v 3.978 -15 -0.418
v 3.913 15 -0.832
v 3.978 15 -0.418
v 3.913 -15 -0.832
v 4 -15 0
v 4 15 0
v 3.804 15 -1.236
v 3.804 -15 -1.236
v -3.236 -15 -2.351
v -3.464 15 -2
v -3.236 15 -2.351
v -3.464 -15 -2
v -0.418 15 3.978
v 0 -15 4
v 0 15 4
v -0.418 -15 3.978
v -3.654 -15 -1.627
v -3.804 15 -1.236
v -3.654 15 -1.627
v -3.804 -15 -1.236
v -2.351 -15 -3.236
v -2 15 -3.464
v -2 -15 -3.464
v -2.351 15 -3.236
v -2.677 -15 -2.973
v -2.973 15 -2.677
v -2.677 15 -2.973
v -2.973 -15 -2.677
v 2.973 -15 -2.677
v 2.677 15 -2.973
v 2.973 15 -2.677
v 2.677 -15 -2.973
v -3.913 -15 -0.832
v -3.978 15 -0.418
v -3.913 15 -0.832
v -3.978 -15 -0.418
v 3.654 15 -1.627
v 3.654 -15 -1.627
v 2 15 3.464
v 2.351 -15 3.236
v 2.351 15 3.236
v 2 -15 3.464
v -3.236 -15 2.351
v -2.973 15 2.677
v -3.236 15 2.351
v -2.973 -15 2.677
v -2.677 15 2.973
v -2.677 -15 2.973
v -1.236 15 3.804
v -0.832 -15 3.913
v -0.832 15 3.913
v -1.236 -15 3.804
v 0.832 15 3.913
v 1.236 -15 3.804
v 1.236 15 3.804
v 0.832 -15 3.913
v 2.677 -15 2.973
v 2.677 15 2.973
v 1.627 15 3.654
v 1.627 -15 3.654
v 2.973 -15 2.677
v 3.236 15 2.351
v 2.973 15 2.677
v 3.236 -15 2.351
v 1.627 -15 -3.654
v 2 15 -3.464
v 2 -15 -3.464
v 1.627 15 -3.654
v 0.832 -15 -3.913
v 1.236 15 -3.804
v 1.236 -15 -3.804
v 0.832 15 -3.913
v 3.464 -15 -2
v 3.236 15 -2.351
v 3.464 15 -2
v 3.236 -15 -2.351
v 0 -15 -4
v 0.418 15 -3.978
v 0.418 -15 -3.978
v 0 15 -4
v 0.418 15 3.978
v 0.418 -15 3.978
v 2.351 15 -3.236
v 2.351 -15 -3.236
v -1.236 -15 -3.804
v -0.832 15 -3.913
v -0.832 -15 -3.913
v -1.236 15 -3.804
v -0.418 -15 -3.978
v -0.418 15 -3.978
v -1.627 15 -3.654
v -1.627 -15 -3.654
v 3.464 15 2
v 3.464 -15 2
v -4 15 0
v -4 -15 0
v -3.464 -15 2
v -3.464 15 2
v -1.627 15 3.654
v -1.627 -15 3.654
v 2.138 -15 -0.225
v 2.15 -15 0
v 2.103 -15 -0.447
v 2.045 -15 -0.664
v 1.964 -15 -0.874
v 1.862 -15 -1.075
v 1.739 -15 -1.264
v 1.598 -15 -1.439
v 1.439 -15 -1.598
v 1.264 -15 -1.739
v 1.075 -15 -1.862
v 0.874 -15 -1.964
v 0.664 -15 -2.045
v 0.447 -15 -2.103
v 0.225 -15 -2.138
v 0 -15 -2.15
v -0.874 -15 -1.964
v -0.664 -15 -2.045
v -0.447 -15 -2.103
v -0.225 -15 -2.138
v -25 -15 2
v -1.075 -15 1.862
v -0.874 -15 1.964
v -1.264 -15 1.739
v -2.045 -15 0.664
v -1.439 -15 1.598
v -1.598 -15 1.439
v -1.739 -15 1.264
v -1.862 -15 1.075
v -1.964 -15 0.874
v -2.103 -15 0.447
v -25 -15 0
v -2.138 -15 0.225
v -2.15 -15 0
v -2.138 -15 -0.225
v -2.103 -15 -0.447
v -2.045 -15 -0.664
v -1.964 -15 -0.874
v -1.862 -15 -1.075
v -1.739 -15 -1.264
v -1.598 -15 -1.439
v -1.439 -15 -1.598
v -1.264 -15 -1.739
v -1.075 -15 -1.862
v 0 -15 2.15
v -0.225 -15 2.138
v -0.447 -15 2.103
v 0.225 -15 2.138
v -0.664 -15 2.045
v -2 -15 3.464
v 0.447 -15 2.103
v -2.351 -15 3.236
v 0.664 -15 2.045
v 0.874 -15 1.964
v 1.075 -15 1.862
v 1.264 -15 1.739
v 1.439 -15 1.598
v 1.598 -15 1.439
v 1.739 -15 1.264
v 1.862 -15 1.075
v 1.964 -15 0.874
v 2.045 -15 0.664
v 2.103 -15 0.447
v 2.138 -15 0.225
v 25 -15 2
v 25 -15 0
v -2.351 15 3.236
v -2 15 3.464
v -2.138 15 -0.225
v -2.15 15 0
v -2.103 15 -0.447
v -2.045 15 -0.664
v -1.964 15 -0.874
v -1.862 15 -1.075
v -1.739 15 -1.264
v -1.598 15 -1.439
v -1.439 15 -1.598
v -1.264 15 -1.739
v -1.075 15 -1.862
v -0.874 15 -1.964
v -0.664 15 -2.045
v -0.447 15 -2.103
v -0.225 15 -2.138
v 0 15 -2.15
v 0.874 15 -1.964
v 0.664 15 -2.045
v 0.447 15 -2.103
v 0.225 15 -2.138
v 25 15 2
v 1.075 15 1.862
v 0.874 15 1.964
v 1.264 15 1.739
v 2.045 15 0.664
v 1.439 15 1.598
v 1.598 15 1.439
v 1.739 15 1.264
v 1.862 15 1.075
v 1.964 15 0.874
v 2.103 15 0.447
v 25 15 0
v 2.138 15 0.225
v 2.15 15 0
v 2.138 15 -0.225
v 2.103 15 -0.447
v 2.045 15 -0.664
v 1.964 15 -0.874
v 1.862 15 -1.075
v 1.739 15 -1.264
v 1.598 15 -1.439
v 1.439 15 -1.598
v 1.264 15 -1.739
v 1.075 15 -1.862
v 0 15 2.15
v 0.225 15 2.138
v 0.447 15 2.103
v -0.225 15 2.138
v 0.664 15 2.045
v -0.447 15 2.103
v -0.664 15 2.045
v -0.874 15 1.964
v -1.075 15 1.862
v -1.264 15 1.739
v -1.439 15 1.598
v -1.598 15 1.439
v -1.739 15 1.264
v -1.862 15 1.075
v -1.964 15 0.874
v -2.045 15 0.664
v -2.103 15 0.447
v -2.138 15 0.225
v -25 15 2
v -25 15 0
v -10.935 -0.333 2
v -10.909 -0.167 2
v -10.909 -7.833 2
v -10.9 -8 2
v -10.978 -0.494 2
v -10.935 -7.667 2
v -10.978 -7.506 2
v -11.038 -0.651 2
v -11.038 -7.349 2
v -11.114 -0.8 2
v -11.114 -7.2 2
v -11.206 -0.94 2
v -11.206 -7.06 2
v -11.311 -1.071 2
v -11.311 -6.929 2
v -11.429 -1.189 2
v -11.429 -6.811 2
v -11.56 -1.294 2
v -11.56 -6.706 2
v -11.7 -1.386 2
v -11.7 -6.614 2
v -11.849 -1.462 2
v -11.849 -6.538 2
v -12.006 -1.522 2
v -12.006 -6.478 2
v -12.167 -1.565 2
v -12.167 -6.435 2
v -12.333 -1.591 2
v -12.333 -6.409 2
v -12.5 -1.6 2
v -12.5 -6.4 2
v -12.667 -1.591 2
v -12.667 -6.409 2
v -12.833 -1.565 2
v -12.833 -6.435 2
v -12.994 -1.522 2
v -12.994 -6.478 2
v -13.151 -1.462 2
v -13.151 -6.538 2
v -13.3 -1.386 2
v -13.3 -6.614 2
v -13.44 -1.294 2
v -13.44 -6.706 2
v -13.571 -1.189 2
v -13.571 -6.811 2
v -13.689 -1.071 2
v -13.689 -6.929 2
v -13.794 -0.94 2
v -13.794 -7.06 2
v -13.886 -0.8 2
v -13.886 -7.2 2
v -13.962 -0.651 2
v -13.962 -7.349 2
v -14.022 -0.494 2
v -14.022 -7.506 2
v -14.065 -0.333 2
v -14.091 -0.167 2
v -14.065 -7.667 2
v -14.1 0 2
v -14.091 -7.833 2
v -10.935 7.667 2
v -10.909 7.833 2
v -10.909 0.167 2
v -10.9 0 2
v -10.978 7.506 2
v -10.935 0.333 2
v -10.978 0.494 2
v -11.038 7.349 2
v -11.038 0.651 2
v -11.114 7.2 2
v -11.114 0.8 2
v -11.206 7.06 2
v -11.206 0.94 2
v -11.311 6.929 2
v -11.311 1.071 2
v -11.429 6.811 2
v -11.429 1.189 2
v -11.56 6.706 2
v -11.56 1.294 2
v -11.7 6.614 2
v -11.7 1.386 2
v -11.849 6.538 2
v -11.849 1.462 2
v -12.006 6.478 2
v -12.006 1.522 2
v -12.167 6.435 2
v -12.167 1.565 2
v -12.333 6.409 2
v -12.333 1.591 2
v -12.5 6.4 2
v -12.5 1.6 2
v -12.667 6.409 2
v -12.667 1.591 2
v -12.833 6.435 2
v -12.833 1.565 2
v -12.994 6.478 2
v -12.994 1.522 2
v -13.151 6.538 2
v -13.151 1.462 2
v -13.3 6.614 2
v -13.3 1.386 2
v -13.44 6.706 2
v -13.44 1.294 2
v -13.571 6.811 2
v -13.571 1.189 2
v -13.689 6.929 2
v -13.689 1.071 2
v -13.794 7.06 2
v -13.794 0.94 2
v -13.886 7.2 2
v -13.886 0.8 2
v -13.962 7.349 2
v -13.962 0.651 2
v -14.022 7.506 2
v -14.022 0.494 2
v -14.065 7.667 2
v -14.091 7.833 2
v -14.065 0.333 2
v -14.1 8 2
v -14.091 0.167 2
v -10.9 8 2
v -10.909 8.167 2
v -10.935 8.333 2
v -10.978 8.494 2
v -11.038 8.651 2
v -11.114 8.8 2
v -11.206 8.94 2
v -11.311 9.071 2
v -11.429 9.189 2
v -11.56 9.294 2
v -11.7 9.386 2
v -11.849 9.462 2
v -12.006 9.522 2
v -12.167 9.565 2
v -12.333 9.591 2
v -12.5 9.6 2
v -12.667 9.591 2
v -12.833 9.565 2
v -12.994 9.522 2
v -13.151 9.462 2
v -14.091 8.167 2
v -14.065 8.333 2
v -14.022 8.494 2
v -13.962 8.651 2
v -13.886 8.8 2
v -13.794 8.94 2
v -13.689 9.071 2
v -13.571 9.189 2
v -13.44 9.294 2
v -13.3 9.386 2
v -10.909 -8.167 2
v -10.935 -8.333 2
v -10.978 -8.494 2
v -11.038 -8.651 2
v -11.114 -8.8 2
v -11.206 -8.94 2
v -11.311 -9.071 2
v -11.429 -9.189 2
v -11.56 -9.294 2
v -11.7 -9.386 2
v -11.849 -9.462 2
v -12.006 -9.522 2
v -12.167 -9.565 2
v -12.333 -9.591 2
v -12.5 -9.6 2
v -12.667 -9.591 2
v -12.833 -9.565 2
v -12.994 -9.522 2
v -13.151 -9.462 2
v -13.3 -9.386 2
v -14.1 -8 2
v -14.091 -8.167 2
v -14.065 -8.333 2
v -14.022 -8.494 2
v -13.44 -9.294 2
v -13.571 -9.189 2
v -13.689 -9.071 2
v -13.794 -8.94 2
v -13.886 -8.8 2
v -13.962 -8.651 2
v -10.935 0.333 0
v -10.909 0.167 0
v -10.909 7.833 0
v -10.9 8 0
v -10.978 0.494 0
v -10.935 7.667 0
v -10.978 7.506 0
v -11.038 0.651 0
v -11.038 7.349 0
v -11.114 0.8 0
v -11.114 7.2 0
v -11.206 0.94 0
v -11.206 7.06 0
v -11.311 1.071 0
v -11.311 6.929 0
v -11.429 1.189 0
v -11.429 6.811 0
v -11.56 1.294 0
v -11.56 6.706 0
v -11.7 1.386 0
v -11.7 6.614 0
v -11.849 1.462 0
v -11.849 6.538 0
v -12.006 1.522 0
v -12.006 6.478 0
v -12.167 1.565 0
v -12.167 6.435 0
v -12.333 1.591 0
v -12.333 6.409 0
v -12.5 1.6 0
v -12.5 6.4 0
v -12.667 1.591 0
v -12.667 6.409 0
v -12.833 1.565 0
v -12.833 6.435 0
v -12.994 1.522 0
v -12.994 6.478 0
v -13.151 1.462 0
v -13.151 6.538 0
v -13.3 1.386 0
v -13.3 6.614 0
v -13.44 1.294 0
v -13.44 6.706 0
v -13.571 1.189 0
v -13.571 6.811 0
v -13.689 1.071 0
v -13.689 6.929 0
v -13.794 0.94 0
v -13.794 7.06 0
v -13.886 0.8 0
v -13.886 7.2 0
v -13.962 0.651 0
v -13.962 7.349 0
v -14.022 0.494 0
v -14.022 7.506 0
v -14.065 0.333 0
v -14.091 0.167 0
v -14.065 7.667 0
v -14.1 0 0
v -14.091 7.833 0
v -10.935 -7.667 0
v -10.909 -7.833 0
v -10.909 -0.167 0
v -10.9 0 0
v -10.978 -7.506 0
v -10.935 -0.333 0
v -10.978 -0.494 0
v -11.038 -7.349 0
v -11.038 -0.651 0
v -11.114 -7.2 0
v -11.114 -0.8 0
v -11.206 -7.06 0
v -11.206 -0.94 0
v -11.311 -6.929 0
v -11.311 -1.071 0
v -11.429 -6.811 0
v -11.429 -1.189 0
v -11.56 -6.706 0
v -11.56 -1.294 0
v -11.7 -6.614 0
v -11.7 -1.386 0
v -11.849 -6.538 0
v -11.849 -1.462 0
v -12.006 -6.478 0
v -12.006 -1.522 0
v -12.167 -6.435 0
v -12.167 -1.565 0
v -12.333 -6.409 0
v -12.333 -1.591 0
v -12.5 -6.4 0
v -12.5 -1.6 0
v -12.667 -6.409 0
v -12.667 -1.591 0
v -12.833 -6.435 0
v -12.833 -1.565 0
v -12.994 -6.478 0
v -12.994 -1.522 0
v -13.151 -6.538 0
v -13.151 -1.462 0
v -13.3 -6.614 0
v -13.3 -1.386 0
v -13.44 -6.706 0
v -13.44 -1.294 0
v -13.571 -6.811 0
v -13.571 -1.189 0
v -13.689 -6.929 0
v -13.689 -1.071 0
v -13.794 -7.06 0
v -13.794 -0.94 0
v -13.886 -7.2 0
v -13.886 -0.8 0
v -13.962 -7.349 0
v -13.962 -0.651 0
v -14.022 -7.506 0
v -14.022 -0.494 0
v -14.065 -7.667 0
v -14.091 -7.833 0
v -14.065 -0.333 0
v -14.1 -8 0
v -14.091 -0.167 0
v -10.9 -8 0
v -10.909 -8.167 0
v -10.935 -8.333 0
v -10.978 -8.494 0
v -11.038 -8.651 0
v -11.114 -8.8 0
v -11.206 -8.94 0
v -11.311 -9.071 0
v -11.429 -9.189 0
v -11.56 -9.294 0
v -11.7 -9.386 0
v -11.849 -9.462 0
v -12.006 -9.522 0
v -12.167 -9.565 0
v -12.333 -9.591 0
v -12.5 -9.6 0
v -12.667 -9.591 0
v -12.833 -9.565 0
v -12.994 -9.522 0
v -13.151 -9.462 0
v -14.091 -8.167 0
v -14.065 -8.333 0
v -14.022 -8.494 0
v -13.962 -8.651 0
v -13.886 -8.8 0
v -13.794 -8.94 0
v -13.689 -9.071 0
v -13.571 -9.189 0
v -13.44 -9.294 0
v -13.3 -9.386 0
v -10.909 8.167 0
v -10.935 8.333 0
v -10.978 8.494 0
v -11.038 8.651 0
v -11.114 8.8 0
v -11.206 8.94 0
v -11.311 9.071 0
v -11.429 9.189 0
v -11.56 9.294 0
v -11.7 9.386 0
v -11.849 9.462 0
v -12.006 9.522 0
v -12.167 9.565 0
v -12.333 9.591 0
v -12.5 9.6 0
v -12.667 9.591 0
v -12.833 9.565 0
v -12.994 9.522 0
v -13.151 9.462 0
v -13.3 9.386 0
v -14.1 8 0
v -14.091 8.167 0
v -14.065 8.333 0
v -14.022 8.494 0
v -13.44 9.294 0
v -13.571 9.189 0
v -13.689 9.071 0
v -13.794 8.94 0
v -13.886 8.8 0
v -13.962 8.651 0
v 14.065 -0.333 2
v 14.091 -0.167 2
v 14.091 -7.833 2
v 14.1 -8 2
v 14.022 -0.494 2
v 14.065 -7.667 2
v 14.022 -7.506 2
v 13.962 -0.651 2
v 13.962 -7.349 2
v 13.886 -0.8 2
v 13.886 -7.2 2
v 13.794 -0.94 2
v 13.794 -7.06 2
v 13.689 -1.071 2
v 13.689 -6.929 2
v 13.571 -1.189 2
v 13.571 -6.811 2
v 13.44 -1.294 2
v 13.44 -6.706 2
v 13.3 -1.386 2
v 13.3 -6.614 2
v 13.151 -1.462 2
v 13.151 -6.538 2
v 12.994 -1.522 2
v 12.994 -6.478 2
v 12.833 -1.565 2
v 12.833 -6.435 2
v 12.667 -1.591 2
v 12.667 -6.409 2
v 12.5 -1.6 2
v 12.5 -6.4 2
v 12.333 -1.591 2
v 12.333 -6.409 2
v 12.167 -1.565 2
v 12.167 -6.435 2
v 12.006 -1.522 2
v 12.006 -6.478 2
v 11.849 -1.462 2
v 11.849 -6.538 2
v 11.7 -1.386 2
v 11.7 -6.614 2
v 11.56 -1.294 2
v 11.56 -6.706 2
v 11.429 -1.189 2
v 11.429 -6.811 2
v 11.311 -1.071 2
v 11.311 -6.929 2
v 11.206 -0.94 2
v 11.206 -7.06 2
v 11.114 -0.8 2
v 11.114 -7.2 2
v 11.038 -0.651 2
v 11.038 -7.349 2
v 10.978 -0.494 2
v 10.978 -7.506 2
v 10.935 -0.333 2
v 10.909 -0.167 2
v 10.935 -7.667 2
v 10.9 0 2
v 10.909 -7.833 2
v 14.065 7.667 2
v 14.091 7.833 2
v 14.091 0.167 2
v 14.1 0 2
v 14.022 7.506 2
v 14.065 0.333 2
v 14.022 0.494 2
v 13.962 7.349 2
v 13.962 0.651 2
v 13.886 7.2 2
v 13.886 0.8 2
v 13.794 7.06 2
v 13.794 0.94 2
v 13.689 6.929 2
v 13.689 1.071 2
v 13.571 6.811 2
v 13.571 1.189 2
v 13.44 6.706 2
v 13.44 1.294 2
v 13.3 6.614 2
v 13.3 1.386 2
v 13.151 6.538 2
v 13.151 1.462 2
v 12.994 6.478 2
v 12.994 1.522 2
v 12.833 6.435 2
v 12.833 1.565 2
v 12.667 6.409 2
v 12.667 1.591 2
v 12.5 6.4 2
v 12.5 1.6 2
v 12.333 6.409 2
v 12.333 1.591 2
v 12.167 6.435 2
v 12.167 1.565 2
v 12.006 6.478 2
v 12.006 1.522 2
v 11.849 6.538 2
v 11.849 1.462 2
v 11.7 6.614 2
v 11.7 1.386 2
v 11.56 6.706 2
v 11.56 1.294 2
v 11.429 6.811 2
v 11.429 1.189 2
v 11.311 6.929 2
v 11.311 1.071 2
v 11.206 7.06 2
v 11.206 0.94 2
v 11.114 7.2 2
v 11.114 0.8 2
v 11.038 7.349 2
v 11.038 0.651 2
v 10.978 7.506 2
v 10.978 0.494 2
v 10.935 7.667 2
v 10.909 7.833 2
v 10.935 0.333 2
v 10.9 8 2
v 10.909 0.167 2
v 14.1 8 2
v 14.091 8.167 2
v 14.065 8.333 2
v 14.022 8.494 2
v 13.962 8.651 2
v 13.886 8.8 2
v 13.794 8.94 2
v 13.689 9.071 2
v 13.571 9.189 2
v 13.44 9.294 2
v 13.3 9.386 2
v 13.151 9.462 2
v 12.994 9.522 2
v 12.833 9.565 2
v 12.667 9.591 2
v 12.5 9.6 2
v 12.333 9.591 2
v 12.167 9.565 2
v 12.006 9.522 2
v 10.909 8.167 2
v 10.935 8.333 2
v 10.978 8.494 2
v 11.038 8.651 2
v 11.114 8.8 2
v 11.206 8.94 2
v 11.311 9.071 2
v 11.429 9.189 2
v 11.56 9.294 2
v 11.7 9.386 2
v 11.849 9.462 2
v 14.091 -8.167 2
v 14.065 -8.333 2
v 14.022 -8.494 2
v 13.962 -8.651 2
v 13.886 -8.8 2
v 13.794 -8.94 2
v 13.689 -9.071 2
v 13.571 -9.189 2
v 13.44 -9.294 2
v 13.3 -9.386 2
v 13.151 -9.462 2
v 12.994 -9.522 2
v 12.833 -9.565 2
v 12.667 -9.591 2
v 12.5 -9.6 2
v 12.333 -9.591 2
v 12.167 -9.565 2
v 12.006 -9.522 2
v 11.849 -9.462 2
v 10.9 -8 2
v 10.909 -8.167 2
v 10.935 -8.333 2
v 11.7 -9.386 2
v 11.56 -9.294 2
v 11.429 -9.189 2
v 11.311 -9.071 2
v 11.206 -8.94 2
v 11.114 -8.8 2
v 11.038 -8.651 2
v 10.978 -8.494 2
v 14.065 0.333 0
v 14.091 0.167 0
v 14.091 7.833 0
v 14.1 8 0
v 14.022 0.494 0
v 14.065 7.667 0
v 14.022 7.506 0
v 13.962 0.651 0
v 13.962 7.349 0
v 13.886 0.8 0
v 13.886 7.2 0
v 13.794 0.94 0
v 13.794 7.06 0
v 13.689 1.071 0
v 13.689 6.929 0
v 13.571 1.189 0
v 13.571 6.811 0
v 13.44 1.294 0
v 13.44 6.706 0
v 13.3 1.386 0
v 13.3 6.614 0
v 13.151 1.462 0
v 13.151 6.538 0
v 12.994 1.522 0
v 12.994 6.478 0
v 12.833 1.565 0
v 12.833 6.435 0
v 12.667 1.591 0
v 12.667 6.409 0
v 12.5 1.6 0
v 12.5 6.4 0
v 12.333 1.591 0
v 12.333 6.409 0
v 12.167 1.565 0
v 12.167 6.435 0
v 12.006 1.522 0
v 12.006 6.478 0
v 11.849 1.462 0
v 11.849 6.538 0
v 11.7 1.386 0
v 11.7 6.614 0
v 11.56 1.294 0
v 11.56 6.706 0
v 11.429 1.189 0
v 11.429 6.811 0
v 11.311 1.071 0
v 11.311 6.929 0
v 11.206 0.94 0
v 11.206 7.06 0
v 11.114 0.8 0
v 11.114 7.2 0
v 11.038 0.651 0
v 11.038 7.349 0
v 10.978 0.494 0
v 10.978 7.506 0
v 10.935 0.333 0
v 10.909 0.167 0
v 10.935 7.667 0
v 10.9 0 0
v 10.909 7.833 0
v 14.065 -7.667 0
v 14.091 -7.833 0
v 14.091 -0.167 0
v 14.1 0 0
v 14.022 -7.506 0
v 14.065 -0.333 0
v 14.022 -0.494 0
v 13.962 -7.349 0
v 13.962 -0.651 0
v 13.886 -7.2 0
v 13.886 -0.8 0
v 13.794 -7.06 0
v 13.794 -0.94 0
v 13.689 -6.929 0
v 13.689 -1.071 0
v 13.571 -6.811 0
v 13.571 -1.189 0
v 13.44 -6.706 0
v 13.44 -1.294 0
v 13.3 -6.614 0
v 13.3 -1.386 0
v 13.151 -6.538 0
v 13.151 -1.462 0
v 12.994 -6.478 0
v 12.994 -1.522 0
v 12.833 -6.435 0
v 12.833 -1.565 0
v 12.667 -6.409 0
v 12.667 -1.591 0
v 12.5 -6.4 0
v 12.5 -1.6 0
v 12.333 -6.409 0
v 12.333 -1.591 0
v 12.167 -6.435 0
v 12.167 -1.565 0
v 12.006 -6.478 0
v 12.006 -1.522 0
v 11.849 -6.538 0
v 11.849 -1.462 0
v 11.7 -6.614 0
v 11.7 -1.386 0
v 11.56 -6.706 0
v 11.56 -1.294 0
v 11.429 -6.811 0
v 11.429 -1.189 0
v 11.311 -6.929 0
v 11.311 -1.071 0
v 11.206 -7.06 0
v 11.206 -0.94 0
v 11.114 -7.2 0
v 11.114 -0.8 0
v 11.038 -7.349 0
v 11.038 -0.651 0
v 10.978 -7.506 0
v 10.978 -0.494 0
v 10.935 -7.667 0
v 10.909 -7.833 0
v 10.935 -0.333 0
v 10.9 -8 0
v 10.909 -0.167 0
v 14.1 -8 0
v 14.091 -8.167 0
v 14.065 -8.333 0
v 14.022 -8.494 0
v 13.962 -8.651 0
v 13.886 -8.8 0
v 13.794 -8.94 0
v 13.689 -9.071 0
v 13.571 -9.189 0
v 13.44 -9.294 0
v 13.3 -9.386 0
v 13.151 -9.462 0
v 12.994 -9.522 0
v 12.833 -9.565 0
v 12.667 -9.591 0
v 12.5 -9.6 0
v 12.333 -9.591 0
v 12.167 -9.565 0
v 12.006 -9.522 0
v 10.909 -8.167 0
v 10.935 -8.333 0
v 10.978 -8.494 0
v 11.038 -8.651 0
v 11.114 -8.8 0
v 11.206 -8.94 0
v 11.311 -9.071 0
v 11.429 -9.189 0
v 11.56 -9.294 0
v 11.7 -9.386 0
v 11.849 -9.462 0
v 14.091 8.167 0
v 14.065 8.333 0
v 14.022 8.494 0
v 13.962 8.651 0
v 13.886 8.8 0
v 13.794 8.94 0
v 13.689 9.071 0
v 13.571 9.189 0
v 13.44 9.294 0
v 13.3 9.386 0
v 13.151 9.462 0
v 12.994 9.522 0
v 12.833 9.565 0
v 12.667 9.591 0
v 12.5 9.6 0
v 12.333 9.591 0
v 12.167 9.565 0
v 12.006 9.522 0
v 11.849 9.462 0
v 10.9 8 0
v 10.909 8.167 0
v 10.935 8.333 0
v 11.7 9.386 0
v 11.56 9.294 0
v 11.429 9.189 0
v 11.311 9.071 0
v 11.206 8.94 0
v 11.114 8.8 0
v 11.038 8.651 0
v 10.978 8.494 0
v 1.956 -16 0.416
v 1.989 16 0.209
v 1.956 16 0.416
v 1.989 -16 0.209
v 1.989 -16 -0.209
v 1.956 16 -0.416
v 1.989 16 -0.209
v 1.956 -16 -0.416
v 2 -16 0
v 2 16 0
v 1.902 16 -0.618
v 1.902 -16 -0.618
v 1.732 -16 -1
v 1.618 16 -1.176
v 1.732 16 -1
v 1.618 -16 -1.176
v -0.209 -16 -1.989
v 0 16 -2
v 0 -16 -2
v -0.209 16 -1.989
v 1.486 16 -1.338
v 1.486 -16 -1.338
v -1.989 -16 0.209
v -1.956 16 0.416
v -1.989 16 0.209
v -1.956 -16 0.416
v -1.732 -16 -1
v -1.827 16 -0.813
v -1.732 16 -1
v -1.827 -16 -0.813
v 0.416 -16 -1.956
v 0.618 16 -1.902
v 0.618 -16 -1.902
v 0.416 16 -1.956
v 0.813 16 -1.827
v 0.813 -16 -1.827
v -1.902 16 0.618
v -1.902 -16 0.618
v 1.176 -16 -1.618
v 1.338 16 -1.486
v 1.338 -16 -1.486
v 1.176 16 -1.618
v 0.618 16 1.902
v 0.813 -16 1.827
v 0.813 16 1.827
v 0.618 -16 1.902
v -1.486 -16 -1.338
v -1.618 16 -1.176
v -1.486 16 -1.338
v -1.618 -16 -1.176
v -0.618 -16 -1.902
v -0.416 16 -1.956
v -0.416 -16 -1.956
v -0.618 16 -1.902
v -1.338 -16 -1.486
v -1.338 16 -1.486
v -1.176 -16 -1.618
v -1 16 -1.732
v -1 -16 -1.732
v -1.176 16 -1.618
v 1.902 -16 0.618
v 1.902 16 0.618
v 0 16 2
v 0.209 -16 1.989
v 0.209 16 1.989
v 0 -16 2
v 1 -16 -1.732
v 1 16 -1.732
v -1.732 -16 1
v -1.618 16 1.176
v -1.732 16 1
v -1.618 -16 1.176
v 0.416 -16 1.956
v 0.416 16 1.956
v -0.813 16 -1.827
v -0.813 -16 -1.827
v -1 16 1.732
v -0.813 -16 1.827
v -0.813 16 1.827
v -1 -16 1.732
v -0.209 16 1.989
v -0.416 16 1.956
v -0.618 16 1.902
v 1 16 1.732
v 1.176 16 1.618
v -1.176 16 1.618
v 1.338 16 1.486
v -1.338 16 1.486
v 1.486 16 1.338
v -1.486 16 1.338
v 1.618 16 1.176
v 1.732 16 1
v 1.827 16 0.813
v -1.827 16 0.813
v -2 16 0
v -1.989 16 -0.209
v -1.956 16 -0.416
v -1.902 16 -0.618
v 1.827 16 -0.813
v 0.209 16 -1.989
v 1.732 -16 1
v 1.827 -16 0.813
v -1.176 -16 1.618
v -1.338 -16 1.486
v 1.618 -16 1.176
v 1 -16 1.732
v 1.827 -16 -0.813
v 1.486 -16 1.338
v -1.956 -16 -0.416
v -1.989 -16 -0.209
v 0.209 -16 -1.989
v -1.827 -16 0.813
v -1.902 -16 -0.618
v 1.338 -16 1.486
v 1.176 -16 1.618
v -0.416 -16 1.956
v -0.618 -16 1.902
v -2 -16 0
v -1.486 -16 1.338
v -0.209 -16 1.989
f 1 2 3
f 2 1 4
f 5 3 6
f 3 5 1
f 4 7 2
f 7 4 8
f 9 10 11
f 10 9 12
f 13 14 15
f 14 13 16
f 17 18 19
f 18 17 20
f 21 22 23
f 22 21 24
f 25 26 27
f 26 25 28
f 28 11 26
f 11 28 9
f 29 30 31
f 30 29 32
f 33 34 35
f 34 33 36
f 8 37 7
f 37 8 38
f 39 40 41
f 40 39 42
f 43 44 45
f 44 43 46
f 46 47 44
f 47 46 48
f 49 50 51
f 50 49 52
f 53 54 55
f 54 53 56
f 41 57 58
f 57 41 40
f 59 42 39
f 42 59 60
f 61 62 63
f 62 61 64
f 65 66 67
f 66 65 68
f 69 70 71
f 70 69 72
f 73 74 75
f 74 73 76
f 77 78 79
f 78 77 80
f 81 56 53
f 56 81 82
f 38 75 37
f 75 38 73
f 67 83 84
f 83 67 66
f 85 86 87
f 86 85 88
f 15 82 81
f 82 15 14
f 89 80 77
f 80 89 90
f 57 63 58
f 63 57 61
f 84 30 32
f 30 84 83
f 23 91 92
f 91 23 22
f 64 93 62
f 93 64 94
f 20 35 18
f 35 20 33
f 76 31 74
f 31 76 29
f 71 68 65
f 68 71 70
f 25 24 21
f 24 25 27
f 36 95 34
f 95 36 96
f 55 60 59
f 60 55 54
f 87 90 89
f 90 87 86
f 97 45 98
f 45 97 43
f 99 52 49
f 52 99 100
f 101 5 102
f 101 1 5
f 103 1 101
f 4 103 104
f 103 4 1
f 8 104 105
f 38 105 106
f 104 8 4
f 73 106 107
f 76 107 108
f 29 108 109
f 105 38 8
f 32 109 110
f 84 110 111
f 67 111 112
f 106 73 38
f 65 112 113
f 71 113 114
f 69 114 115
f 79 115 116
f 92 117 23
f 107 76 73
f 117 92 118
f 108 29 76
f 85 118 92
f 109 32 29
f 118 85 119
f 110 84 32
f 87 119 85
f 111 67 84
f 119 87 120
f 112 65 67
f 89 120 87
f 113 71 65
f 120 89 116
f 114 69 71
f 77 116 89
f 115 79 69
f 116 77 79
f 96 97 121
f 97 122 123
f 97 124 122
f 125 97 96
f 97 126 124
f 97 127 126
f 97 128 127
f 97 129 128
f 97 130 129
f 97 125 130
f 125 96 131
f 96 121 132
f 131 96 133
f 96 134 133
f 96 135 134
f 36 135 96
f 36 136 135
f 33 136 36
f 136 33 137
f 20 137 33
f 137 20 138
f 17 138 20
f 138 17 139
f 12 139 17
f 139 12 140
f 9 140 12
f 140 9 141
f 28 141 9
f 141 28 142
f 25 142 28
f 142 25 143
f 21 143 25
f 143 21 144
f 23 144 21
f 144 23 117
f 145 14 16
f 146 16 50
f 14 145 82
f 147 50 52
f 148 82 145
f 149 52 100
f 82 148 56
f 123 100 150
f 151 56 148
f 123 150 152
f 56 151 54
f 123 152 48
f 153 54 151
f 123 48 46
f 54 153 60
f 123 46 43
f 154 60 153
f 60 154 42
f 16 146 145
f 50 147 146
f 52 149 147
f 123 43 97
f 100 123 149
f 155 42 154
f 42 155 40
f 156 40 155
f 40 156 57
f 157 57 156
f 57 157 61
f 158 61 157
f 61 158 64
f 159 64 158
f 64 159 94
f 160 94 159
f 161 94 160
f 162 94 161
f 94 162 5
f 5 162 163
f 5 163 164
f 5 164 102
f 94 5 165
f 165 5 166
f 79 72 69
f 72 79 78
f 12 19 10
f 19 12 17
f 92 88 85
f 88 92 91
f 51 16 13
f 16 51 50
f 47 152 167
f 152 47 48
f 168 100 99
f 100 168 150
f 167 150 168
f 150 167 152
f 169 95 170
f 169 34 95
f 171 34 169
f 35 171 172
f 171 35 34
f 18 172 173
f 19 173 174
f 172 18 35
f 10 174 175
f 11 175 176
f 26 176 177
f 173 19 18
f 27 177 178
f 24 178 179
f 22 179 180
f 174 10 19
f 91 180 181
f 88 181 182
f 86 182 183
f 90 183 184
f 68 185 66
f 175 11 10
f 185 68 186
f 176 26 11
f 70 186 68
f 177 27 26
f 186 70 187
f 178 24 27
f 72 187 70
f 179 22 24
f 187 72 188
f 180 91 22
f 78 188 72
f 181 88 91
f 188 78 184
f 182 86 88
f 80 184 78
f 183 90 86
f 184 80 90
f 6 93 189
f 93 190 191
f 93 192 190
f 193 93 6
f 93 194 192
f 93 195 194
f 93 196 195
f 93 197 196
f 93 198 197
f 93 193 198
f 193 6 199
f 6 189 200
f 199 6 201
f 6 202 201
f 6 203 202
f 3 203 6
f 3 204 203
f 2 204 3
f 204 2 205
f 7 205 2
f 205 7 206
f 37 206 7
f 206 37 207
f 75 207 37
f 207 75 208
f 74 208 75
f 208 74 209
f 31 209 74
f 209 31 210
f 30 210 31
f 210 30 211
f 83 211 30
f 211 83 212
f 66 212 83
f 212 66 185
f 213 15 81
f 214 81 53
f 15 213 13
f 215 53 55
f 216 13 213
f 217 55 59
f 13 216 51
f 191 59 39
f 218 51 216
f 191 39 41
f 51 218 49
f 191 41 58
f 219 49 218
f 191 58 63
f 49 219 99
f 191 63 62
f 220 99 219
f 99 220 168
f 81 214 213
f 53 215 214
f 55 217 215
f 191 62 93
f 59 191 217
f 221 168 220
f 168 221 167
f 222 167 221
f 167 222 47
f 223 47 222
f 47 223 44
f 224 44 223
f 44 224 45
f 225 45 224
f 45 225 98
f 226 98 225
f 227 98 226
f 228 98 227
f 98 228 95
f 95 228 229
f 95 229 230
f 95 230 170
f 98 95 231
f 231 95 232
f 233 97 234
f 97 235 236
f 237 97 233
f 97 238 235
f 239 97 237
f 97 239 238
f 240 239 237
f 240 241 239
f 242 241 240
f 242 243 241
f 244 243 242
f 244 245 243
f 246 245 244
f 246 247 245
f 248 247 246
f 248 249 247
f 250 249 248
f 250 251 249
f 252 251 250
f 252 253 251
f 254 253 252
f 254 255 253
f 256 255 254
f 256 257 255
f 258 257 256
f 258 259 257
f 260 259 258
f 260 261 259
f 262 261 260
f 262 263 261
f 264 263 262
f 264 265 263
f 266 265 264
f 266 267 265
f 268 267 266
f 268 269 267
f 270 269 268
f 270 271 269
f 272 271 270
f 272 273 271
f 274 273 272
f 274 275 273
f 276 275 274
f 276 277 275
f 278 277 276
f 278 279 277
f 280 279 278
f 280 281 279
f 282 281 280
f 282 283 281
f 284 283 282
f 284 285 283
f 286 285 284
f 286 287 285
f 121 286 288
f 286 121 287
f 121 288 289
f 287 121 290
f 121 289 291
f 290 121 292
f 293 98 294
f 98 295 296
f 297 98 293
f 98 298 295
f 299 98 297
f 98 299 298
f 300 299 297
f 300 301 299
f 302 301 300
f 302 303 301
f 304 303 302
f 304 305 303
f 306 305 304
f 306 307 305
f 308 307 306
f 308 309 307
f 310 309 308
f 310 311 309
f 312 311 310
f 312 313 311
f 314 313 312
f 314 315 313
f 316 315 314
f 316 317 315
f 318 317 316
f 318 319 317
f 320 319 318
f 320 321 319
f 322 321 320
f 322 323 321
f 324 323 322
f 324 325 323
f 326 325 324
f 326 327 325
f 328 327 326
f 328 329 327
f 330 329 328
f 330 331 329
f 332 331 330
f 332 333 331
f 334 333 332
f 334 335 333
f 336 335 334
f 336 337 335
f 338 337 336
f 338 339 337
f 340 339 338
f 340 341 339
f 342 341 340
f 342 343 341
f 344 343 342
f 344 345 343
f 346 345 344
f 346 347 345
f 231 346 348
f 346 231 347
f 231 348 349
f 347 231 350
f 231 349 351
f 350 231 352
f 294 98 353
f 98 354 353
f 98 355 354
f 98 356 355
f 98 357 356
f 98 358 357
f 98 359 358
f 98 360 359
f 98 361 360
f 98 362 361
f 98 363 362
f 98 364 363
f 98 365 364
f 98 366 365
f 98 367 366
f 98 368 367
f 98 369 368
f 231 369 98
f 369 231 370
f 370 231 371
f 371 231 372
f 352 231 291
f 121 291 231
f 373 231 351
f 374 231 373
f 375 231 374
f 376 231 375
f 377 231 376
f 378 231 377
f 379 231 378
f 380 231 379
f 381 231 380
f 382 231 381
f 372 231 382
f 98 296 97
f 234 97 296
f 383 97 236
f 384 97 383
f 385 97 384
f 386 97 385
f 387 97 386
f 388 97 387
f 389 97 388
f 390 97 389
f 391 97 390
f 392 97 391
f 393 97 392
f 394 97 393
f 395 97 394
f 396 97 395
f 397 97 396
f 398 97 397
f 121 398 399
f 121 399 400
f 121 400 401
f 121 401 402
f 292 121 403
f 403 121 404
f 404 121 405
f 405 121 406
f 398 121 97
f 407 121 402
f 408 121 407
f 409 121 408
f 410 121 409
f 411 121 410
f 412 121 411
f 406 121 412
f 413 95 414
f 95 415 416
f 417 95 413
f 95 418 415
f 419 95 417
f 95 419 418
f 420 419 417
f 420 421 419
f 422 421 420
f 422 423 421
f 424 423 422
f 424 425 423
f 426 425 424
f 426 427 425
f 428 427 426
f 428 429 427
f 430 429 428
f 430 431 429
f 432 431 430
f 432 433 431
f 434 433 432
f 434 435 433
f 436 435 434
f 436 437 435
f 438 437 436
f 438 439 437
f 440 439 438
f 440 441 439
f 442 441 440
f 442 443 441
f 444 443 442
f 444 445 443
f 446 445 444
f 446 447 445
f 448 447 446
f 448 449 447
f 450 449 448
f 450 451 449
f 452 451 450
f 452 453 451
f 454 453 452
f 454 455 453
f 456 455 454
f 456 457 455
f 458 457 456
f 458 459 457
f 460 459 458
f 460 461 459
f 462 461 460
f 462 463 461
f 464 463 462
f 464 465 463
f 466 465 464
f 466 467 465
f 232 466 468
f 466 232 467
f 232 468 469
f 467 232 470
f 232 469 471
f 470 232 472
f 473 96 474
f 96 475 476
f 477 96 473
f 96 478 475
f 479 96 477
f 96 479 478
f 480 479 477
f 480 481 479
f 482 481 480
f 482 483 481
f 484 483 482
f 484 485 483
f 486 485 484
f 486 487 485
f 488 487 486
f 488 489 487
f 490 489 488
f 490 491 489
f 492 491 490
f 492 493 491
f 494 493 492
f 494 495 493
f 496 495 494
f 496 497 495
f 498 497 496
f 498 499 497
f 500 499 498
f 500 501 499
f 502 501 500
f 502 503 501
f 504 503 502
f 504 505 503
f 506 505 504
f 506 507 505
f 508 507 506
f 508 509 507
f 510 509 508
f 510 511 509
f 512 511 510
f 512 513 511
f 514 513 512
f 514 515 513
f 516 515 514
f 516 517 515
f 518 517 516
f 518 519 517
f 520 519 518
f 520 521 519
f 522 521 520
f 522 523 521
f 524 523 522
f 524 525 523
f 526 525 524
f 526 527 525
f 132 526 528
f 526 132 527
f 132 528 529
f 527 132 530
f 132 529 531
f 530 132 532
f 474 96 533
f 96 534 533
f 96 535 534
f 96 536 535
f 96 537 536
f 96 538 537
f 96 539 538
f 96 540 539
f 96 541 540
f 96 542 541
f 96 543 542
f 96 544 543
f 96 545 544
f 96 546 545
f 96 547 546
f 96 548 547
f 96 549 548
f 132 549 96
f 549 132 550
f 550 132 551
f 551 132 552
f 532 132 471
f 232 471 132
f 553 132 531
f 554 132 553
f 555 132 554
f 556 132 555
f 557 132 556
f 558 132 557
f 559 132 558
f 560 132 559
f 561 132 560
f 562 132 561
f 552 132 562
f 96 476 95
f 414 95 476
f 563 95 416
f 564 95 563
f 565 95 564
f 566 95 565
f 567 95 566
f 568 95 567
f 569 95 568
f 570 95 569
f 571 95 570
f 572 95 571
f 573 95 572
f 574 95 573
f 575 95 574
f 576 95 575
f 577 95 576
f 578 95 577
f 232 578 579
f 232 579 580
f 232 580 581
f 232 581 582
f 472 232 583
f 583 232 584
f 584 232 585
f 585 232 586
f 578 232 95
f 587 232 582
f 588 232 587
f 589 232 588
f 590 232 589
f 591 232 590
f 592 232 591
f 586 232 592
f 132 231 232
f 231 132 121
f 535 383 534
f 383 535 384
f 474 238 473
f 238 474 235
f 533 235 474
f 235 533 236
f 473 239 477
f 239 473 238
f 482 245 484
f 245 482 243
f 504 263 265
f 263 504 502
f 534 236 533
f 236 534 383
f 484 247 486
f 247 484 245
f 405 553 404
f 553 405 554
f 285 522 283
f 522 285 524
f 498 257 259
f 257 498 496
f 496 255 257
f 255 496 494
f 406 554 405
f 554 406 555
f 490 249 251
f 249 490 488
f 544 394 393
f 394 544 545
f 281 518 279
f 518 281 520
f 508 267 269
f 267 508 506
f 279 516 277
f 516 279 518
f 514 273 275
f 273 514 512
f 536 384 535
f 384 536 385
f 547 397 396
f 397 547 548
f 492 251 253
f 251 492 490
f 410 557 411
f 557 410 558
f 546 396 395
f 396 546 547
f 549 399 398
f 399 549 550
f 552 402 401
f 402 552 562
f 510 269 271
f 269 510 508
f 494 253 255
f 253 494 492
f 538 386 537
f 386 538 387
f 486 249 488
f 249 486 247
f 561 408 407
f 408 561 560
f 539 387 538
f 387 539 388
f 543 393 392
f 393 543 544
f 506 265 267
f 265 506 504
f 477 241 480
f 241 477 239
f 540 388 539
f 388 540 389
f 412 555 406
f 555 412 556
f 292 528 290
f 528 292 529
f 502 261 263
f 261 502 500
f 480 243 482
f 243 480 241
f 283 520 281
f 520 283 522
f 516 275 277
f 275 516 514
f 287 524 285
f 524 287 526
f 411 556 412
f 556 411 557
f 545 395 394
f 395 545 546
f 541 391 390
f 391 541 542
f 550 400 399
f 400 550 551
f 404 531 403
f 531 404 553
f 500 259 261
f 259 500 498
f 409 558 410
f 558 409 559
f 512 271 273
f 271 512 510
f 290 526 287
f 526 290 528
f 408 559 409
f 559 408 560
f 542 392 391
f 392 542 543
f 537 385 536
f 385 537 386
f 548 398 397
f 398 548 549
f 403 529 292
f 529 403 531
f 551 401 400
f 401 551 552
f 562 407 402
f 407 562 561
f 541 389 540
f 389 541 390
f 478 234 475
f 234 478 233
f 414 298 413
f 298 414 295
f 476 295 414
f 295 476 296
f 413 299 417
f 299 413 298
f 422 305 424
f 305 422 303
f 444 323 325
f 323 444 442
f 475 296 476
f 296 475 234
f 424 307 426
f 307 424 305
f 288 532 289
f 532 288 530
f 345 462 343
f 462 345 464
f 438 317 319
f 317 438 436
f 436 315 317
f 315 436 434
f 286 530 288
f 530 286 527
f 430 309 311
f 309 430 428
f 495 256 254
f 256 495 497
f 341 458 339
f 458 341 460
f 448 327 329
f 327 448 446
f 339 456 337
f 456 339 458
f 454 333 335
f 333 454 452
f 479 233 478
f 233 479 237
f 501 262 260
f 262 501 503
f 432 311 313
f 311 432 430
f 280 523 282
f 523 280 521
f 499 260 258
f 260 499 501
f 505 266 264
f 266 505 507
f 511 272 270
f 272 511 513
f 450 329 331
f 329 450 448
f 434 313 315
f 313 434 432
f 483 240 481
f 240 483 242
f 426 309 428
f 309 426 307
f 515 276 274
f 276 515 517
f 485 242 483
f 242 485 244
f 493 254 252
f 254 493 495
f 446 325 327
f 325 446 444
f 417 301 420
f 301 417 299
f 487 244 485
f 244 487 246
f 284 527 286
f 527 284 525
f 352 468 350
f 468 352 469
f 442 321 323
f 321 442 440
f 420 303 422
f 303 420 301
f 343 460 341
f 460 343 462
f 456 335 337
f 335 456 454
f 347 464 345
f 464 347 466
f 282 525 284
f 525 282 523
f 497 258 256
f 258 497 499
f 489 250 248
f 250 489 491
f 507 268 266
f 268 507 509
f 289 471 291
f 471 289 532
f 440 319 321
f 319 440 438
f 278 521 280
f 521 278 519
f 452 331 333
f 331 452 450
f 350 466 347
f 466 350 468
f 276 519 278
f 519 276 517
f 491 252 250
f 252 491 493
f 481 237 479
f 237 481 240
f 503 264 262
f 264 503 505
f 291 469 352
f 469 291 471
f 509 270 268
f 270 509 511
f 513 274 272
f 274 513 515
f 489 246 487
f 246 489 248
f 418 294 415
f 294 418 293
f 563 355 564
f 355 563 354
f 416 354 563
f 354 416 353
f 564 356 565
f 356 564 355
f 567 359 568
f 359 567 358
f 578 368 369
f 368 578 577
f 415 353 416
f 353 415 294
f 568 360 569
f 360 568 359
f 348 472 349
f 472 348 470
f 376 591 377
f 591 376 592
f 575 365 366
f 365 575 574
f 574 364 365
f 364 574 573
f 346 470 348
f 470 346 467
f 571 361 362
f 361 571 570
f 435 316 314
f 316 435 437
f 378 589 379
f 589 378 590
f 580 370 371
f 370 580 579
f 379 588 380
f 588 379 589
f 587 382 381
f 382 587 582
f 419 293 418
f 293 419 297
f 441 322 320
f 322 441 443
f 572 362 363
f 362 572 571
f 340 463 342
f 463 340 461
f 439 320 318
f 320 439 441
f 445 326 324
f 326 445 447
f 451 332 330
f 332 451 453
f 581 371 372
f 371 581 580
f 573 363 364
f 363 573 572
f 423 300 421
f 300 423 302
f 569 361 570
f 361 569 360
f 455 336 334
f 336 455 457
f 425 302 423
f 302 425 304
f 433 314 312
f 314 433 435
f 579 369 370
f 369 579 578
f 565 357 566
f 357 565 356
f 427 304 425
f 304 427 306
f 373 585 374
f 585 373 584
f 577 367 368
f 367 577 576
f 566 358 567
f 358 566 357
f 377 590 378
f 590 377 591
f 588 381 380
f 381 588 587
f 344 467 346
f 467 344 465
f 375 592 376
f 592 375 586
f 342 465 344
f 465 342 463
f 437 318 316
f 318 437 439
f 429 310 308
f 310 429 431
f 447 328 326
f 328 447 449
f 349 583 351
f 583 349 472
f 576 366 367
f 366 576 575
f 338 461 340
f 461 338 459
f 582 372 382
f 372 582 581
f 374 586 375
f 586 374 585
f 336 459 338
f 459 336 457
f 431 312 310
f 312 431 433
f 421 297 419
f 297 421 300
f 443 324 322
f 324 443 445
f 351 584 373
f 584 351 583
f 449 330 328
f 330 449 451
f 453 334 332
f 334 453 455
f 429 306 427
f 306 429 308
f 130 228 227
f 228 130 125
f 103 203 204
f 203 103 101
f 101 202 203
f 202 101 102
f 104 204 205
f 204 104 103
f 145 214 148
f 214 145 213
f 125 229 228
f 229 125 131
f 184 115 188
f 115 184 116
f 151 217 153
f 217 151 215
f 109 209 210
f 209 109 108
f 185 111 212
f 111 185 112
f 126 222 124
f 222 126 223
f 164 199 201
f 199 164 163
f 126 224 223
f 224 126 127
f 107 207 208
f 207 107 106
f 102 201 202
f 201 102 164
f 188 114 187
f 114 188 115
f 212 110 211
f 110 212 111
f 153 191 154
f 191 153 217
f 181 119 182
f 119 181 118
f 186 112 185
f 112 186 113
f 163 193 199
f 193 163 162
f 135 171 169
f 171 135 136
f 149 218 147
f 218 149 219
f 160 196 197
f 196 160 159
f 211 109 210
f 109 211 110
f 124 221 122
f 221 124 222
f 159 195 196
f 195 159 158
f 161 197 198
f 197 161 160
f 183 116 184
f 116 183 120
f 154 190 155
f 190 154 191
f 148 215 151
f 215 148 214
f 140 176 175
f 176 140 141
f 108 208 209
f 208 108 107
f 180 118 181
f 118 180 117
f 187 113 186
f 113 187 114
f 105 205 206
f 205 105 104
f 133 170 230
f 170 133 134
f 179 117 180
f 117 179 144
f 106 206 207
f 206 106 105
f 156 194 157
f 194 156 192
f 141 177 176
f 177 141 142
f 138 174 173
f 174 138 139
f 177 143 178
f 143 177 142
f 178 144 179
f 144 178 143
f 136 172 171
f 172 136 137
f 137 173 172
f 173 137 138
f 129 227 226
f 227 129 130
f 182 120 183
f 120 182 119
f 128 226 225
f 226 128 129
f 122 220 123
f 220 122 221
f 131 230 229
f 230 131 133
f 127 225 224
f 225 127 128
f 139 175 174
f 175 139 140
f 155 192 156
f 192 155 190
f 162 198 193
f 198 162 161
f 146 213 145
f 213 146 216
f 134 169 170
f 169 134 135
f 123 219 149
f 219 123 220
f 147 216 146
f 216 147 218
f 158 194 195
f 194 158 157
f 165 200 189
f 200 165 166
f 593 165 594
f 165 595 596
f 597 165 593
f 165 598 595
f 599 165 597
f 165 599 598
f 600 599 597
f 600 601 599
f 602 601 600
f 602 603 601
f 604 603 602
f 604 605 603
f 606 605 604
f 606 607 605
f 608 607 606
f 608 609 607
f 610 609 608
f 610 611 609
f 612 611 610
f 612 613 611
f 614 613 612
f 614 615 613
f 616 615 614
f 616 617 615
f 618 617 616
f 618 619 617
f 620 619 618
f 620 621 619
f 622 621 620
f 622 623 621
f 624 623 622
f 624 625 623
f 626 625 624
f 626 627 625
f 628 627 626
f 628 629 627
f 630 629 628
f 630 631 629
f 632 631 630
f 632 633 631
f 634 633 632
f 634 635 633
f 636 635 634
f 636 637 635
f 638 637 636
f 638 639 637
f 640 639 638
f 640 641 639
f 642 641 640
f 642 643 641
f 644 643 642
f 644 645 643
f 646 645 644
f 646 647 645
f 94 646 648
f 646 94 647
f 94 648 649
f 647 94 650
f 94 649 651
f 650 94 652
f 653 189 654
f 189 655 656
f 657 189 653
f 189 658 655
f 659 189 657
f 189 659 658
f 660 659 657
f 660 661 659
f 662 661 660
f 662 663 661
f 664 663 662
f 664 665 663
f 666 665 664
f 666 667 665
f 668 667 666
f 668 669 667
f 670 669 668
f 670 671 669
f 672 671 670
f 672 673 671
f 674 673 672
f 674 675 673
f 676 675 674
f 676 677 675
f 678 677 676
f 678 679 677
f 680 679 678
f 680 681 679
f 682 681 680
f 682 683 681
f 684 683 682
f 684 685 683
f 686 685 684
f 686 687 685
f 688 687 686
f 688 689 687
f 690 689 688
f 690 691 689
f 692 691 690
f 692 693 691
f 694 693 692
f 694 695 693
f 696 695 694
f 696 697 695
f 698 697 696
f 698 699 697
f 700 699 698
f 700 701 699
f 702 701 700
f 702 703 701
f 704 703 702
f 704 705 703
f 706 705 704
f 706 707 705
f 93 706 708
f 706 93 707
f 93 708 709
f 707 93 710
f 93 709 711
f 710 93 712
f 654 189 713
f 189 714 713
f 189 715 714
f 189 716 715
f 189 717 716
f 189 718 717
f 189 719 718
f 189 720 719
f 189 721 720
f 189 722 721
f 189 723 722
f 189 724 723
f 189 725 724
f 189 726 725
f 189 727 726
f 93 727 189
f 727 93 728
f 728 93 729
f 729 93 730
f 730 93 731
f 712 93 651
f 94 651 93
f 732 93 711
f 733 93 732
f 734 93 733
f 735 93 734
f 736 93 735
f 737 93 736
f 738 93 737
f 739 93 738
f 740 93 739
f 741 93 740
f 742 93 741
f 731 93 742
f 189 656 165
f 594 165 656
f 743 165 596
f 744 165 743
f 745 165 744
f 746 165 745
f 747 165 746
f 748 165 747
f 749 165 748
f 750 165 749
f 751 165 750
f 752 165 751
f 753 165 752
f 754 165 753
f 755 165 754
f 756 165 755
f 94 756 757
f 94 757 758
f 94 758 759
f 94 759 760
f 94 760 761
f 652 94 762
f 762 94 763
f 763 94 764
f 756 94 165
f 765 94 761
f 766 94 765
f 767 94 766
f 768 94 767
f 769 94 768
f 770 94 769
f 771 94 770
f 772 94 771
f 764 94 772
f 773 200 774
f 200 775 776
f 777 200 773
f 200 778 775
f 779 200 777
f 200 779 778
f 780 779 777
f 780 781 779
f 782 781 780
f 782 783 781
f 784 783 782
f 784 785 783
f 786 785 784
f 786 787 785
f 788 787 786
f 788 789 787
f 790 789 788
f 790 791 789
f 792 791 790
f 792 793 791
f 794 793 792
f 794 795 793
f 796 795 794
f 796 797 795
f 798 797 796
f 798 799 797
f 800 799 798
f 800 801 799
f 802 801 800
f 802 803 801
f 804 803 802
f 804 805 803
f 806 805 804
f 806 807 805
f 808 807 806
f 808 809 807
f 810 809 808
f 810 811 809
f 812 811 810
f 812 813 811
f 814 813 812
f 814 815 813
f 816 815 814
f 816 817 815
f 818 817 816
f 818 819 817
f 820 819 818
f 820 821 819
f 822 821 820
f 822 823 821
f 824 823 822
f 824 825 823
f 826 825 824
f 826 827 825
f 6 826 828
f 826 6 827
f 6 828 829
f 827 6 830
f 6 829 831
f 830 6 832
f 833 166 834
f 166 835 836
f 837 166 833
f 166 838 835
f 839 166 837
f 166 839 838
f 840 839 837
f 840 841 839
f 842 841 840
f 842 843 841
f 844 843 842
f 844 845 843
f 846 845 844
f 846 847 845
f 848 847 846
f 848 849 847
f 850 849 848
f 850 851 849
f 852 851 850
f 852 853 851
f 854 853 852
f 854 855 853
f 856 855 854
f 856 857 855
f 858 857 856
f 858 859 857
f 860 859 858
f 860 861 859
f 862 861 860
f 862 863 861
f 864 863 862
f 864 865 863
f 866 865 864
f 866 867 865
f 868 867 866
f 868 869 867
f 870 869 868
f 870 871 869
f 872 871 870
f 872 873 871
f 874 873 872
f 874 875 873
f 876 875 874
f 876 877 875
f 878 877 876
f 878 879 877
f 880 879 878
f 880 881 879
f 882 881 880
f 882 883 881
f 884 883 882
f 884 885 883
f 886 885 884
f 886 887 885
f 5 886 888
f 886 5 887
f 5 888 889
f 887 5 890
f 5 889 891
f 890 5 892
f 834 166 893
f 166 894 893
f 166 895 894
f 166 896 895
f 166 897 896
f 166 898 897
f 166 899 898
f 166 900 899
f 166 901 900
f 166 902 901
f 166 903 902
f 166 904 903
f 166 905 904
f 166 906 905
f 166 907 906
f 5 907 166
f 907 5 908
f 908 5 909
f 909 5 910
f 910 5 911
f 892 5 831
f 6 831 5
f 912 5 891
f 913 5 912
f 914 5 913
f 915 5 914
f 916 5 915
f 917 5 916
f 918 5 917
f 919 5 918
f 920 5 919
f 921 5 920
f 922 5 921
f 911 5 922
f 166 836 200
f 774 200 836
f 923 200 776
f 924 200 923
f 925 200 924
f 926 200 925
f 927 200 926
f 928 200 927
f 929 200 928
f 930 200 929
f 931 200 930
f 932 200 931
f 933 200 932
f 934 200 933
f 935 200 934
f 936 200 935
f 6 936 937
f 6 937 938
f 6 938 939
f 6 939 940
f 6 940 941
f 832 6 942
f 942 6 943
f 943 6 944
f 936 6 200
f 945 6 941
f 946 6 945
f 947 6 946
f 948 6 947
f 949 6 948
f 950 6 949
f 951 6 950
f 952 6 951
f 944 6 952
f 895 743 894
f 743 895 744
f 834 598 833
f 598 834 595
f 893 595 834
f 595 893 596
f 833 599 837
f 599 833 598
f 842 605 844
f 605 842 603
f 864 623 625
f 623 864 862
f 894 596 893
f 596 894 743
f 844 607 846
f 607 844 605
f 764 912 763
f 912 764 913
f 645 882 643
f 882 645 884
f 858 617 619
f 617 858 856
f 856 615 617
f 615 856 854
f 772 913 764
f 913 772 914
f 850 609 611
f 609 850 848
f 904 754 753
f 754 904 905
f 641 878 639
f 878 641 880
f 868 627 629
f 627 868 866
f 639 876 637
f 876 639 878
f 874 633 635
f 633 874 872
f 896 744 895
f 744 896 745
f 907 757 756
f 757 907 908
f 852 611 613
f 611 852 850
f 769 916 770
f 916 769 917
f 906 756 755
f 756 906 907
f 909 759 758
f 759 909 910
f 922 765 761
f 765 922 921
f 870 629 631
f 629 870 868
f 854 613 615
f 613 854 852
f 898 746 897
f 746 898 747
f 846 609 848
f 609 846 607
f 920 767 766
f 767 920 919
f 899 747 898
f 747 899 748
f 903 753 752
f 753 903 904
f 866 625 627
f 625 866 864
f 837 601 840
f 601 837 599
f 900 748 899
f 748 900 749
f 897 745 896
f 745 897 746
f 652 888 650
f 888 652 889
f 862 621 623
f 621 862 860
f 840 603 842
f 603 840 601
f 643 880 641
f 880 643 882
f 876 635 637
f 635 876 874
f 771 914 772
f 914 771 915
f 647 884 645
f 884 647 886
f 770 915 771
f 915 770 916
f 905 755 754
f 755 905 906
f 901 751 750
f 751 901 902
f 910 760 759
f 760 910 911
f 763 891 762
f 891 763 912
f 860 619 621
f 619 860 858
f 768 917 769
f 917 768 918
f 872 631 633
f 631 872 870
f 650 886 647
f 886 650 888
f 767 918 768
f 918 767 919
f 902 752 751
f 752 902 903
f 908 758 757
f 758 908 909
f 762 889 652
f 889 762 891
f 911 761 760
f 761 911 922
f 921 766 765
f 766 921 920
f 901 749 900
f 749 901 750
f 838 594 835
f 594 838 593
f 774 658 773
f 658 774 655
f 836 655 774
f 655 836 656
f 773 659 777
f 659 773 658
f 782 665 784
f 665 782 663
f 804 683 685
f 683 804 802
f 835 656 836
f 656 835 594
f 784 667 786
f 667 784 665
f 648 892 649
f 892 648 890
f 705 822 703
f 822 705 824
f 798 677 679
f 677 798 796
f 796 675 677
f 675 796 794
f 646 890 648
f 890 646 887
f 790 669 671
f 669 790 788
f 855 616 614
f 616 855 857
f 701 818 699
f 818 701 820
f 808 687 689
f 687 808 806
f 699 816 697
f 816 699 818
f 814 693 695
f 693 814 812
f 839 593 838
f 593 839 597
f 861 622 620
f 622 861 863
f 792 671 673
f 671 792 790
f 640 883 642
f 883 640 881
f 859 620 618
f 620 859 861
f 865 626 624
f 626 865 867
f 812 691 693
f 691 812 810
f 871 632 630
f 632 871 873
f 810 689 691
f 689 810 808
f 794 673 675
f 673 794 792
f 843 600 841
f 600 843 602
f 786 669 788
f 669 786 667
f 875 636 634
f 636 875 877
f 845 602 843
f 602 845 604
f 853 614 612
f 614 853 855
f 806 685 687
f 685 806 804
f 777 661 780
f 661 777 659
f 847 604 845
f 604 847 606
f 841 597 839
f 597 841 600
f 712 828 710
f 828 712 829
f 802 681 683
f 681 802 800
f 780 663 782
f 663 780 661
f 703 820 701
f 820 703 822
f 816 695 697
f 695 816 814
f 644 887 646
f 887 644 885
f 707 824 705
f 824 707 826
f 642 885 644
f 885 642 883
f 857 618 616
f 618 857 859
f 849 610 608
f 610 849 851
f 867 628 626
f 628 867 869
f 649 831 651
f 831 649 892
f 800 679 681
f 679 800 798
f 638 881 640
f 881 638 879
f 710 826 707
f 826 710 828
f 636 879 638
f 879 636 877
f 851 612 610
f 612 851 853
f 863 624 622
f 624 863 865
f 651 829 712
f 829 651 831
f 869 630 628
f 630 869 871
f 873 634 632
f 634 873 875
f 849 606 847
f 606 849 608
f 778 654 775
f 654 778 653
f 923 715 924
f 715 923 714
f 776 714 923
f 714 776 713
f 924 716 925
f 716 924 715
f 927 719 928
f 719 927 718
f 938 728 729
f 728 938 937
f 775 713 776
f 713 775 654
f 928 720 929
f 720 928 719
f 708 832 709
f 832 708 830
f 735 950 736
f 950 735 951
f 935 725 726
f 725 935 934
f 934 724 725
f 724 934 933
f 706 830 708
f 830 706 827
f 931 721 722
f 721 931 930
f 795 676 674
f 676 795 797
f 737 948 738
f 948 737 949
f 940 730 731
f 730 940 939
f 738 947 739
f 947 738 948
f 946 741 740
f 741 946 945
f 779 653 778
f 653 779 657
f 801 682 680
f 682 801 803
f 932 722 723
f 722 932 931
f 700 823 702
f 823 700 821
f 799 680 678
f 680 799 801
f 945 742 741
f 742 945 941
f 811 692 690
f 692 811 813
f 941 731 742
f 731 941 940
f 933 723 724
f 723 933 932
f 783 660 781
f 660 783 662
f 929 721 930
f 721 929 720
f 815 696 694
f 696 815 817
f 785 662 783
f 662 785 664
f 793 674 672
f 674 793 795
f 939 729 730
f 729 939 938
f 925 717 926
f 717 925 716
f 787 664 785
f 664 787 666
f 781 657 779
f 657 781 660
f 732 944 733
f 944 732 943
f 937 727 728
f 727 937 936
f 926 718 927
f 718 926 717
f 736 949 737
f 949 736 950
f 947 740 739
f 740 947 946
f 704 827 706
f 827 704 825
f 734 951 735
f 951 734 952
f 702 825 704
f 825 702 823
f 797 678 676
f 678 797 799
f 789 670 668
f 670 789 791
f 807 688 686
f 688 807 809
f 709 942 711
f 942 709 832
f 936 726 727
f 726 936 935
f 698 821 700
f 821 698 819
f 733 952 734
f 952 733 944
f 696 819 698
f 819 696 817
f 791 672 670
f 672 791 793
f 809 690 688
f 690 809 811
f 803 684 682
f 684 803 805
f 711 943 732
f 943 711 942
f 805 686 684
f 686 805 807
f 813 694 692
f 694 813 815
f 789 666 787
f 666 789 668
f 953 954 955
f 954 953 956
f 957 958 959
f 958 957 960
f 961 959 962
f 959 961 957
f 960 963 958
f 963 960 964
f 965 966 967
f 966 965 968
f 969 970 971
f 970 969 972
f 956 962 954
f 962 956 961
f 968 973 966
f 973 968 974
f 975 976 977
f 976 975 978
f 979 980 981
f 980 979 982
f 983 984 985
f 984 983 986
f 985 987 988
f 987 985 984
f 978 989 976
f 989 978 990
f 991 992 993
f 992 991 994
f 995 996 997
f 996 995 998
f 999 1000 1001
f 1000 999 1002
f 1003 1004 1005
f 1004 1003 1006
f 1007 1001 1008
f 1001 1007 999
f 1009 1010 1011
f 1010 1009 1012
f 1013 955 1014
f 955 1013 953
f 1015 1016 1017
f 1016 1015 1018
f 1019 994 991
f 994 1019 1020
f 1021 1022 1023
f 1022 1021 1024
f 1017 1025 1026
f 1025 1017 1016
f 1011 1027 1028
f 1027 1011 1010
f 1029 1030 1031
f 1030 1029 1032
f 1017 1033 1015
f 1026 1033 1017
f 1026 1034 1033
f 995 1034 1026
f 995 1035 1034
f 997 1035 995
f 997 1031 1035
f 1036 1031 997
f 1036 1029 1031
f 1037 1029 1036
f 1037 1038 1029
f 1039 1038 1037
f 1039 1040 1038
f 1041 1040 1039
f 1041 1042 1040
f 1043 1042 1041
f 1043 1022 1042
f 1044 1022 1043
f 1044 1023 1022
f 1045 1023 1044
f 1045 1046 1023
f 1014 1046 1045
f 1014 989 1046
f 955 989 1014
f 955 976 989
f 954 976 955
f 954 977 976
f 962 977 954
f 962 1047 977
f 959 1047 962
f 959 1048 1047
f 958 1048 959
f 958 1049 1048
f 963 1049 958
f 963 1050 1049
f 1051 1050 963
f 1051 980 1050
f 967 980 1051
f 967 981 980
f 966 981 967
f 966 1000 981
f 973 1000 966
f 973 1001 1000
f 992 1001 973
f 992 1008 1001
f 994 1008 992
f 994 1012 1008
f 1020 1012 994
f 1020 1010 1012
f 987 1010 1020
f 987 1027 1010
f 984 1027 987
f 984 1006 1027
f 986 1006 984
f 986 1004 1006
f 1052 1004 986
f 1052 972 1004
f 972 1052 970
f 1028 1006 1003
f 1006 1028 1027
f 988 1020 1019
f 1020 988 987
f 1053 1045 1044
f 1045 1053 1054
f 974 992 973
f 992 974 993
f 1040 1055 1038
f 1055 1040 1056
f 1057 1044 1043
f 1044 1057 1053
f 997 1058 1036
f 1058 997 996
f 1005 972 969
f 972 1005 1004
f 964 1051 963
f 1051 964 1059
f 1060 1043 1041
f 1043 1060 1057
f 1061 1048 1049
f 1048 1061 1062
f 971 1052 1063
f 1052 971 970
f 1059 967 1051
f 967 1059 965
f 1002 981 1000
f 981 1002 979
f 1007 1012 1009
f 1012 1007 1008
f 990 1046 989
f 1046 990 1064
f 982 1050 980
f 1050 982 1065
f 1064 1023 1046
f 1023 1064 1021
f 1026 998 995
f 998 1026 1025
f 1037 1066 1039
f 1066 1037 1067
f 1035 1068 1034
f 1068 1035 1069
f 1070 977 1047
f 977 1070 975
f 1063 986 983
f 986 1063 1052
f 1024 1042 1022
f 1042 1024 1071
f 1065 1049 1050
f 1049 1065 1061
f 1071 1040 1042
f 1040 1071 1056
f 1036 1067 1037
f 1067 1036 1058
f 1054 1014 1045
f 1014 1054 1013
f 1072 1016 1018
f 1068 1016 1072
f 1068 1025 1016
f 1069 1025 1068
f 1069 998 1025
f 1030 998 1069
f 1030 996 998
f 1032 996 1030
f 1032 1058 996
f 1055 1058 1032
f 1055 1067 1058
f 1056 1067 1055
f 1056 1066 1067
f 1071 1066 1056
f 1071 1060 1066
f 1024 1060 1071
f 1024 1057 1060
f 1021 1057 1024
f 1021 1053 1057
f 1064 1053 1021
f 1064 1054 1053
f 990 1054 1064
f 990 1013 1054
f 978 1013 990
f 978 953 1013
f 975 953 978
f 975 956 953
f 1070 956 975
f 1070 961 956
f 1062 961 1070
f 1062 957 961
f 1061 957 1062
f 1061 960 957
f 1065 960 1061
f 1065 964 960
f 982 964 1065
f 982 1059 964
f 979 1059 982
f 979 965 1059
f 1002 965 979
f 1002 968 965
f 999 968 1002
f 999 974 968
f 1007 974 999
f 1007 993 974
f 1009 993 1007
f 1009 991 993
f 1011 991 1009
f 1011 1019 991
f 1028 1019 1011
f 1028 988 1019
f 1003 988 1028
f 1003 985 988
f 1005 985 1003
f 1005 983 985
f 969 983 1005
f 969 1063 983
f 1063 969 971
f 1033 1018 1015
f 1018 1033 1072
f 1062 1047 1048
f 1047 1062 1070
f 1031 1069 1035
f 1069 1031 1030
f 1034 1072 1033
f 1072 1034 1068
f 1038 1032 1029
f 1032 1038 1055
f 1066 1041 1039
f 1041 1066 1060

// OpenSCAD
// Parameters
leaf_w = 25;
leaf_h = 30;
leaf_t = 2;
knuckle_od = 8;
knuckle_id = 4.3;
pin_d = 4;
pin_l = 32;
knuckle_segment = 6; // 30mm / 5 = 6mm
hole_pitch = 8;

$fn = 60;

module hinge() {
    // Left Leaf
    difference() {
        union() {
            translate([-leaf_w, -leaf_h / 2, 0]) cube([leaf_w, leaf_h, leaf_t]);
            for (i = [0, 2, 4]) {
                translate([0, -leaf_h / 2 + i * knuckle_segment, 0])
                rotate([-90, 0, 0])
                cylinder(d = knuckle_od, h = knuckle_segment);
            }
        }
        // Pin hole
        translate([0, -leaf_h / 2, 0]) rotate([-90, 0, 0]) cylinder(d = knuckle_id, h = leaf_h);
        // Screw holes
        for (i = [-1, 0, 1]) {
            translate([-12.5, i * hole_pitch, -1]) {
                cylinder(d = 3.2, h = 4);
                cylinder(d1 = 6, d2 = 3.2, h = 1);
            }
        }
    }

    // Right Leaf
    difference() {
        union() {
            translate([0, -leaf_h / 2, 0]) cube([leaf_w, leaf_h, leaf_t]);
            for (i = [1, 3]) {
                translate([0, -leaf_h / 2 + i * knuckle_segment, 0])
                rotate([-90, 0, 0])
                cylinder(d = knuckle_od, h = knuckle_segment);
            }
        }
        // Pin hole
        translate([0, -leaf_h / 2, 0]) rotate([-90, 0, 0]) cylinder(d = knuckle_id, h = leaf_h);
        // Screw holes
        for (i = [-1, 0, 1]) {
            translate([12.5, i * hole_pitch, -1]) {
                cylinder(d = 3.2, h = 4);
                cylinder(d1 = 6, d2 = 3.2, h = 1);
            }
        }
    }

    // Pin
    translate([0, -pin_l / 2, 0]) rotate([-90, 0, 0]) cylinder(d = pin_d, h = pin_l);
}

hinge();
